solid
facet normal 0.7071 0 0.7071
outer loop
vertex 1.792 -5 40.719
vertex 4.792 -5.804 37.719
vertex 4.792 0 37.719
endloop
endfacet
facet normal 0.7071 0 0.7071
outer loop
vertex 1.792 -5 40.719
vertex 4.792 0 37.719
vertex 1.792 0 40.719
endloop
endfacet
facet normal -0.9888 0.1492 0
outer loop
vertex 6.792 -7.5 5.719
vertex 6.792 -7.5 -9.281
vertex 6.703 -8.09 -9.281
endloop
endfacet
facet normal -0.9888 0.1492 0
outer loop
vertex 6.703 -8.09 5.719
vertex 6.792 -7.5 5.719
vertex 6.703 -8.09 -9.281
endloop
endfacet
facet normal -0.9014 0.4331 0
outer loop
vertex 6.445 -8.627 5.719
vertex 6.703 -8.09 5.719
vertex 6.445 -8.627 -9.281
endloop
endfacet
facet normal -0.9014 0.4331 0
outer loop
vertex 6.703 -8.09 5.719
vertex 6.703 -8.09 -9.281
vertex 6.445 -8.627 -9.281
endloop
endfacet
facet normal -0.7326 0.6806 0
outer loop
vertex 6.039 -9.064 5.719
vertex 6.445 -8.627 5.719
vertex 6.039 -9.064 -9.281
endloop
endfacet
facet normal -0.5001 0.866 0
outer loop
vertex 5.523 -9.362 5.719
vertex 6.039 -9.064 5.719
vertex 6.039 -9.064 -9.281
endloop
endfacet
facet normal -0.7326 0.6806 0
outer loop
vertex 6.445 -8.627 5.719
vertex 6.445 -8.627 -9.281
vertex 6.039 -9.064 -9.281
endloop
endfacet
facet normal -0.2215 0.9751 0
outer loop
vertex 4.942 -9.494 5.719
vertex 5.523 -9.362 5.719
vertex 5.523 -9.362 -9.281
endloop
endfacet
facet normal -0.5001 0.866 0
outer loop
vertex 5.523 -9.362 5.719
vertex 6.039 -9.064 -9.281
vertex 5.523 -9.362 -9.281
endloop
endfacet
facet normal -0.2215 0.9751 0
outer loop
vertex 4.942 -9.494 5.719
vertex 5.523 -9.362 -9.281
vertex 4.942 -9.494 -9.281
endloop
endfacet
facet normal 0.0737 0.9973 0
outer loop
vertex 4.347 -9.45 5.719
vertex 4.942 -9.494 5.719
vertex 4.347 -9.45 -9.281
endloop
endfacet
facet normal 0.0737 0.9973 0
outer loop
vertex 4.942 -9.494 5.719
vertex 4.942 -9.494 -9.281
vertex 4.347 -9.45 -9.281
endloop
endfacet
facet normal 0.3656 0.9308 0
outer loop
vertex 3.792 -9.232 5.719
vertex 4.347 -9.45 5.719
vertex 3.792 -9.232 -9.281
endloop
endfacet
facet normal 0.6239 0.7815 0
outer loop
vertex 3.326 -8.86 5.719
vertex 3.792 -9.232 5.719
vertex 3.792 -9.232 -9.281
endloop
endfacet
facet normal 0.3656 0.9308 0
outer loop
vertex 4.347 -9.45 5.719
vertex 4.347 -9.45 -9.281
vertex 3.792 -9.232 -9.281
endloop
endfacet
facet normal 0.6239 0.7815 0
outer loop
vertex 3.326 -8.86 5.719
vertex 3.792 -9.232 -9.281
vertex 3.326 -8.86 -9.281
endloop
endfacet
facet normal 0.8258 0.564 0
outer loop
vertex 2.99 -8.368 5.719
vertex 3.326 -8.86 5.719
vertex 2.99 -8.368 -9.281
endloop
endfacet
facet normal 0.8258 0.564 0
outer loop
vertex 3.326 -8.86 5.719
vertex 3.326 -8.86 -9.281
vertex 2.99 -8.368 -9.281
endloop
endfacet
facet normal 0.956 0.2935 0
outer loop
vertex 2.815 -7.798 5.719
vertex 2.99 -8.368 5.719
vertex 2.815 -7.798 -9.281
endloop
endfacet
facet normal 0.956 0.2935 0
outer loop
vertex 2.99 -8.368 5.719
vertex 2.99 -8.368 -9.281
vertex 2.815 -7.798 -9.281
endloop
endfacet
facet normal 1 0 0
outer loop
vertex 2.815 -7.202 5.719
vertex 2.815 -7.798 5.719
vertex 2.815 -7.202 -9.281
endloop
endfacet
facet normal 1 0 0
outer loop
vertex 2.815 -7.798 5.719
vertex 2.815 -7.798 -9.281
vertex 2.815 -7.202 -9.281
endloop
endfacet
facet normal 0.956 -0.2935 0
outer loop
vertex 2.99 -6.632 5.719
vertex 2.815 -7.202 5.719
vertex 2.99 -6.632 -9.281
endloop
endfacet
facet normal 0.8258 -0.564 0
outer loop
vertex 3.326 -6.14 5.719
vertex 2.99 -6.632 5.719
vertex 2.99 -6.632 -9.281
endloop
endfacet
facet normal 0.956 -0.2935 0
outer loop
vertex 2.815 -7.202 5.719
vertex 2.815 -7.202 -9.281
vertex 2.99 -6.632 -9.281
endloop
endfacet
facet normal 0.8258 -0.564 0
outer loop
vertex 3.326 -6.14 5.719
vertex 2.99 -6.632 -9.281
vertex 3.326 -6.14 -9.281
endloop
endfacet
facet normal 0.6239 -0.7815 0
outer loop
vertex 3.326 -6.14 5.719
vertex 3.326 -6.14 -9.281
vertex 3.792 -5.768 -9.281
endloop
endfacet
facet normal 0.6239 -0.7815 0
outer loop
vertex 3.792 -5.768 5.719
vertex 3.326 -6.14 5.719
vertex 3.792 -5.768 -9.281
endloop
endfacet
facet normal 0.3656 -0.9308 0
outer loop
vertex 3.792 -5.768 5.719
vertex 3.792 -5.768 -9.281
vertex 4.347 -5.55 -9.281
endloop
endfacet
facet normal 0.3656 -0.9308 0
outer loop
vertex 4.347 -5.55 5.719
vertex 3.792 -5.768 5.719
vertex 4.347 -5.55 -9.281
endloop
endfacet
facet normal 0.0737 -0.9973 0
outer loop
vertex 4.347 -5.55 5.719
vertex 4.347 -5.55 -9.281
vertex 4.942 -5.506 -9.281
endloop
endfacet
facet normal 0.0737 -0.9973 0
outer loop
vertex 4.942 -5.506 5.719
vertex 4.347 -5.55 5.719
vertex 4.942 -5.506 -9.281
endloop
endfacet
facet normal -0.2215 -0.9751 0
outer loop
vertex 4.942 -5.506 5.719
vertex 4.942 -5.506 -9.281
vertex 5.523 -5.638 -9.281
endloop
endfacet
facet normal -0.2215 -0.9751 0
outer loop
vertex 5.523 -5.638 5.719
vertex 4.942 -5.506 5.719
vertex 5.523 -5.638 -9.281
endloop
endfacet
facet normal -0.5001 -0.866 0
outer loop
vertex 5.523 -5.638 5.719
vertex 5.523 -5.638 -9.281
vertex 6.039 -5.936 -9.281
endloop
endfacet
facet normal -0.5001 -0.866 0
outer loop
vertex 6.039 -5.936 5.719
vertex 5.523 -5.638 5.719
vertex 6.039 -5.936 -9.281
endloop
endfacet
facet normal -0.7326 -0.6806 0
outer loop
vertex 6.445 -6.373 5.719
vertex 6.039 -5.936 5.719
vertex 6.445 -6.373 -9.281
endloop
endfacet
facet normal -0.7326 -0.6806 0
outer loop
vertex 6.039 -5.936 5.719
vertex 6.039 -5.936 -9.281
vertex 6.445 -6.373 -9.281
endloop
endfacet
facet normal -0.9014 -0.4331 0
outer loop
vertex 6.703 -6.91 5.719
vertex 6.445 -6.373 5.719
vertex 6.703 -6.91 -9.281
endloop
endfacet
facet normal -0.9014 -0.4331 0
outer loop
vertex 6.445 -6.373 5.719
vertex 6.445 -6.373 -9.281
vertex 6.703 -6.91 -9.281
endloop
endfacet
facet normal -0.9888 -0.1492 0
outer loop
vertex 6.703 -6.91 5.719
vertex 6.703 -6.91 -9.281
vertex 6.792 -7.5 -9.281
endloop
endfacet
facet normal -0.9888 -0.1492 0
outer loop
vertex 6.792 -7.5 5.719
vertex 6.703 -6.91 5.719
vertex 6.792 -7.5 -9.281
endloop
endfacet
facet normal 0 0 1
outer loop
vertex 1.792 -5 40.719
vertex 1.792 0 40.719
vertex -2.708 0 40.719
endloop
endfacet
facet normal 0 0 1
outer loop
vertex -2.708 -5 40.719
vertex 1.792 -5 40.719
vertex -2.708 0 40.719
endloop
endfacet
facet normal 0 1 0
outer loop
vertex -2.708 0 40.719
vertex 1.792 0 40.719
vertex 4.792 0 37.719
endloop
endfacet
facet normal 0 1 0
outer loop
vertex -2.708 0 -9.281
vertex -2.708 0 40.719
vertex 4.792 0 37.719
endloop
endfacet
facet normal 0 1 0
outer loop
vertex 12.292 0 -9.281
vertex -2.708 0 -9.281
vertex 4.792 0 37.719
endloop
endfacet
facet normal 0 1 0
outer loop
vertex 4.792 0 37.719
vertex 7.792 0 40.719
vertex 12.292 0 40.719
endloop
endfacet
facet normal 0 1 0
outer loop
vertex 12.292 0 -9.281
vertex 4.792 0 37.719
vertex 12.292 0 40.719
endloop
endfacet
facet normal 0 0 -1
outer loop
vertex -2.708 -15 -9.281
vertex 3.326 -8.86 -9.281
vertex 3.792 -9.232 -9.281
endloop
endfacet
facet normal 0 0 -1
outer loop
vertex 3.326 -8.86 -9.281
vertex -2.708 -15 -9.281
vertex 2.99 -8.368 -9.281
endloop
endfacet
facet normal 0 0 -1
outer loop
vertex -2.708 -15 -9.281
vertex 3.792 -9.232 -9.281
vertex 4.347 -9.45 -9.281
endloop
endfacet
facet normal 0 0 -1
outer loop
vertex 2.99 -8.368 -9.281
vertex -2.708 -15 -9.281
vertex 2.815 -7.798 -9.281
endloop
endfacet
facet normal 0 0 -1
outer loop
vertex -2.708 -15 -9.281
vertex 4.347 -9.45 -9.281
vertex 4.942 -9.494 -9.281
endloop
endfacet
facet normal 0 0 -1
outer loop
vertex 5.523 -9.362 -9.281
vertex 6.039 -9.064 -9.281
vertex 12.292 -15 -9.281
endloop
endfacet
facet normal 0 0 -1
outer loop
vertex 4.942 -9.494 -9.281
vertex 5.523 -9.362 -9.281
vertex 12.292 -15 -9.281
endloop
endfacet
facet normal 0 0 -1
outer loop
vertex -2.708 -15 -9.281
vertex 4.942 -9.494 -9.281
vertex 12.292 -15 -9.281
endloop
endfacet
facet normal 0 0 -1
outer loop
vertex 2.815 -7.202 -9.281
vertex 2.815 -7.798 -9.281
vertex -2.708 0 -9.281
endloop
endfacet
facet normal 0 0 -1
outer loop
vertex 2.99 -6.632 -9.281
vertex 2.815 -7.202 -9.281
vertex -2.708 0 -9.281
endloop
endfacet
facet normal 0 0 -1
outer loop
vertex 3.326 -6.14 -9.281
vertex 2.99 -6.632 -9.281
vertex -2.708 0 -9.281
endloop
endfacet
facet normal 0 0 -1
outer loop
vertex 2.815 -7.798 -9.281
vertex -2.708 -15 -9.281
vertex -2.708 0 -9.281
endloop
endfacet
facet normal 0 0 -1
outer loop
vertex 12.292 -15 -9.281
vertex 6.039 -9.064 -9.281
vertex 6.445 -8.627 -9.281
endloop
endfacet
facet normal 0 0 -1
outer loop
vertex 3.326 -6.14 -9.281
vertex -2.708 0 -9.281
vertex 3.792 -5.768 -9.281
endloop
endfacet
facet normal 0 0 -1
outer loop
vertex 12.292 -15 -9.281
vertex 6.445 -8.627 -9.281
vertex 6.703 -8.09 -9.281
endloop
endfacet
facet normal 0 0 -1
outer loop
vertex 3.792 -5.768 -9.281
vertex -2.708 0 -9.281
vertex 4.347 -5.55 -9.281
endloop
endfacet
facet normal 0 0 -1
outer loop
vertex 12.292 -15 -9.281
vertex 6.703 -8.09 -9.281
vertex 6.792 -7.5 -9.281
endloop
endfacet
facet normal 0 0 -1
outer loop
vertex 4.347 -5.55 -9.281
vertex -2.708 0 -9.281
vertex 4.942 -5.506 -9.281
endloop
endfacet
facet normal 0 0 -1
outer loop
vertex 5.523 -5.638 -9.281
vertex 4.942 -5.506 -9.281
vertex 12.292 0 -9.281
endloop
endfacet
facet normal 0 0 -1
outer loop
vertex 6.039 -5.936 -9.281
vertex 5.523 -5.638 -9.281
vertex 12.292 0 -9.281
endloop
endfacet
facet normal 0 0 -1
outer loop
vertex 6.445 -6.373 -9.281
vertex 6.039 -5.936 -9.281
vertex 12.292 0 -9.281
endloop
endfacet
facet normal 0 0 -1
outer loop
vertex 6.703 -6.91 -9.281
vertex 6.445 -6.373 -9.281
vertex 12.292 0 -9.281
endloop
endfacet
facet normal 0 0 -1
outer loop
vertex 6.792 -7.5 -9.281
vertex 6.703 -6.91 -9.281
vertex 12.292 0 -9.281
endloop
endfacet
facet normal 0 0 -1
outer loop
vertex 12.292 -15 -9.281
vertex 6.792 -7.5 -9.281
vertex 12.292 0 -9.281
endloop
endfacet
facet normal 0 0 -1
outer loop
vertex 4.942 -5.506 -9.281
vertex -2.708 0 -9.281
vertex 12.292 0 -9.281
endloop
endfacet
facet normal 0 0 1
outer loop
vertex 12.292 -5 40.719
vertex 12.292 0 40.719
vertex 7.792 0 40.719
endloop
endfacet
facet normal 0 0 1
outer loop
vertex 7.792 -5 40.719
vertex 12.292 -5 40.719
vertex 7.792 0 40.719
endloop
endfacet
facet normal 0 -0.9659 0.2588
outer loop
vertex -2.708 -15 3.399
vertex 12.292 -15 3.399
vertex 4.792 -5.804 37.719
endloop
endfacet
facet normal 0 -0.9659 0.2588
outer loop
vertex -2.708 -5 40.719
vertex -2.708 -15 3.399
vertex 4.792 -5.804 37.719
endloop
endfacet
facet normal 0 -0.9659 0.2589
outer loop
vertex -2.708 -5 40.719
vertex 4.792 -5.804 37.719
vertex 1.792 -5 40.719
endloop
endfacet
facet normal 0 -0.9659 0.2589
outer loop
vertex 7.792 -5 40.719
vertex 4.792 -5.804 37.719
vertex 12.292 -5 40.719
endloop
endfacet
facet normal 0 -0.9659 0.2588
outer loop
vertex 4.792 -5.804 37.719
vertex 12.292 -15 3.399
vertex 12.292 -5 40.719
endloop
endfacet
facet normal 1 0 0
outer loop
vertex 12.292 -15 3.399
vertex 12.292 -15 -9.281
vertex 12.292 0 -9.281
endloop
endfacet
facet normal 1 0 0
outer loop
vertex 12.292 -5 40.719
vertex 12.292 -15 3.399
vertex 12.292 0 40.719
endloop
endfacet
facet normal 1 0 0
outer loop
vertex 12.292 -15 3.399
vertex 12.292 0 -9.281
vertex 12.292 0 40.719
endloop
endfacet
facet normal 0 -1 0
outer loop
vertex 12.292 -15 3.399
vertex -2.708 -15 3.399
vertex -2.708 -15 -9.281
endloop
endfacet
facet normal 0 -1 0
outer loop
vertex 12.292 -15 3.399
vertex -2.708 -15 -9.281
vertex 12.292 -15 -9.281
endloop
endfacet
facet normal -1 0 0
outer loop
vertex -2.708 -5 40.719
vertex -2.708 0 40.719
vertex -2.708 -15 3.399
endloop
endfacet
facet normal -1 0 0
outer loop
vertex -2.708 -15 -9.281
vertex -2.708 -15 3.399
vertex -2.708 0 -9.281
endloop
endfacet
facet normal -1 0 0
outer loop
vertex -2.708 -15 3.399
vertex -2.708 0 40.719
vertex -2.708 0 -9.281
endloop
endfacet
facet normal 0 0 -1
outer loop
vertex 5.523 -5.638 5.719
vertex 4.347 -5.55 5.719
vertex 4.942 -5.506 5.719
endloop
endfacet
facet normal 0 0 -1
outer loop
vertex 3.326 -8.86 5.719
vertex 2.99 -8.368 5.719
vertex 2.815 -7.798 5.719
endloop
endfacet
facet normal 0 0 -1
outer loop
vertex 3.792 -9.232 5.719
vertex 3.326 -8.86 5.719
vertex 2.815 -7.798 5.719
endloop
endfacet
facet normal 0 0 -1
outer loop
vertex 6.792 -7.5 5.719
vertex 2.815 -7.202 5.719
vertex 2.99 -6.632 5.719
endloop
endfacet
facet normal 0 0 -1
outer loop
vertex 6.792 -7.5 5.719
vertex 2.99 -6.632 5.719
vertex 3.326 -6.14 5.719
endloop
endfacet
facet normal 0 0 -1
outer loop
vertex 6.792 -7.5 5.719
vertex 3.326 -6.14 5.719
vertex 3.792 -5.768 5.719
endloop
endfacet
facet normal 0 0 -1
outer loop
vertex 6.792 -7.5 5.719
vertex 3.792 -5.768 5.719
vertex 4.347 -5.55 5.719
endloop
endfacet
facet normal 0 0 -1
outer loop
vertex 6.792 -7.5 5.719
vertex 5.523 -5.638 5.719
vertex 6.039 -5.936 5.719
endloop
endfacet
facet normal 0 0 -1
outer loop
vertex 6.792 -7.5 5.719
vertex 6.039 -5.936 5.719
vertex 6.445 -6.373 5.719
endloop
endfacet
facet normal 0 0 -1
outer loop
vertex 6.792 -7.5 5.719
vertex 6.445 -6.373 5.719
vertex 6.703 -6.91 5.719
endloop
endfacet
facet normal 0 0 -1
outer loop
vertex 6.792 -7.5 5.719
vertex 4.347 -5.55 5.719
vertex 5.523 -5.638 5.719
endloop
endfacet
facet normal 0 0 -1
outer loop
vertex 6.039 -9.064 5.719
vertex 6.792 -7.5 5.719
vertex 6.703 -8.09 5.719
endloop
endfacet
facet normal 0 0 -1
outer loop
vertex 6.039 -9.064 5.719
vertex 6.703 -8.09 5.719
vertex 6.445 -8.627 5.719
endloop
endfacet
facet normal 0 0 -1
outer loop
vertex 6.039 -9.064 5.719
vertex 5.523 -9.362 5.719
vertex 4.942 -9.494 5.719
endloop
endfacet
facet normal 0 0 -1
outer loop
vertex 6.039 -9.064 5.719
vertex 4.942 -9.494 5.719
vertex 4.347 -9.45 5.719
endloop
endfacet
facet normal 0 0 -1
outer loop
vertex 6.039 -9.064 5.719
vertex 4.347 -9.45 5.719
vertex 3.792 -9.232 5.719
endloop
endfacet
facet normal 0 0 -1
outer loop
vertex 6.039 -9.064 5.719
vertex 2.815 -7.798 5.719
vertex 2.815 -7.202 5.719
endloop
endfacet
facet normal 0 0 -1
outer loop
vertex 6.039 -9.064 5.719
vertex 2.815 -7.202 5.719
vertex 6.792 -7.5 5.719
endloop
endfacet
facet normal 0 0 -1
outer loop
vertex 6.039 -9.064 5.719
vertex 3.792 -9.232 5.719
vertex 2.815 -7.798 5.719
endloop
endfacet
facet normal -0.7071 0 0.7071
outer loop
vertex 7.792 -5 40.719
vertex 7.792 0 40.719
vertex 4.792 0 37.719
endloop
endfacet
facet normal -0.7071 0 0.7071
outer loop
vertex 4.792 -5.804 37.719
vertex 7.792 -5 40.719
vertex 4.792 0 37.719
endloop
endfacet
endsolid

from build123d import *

# Parameters (mm, degrees)
F1_DEPTH = 15
F3_DEPTH = 25
F4_R     = 2
F5_DEPTH = 15


with BuildPart() as f1:
    # F0 (on Front) → F1 (new body)
    with BuildSketch(Plane.XZ):
        Polygon((1.792286, 40.719454), (-2.707714, 40.719454), (-2.707714, -9.280546), (12.292286, -9.280546), (12.292286, 40.719454), (7.792286, 40.719454), (4.792286, 37.719454), align=None)
    extrude(amount=F1_DEPTH)

    # F2 (on face) → F3 (cut)
    with BuildSketch(Plane.YZ.offset(12.292286)):
        Polygon((-15, 3.398946), (-5, 40.719454), (-15, 40.719454), align=None)
    extrude(amount=-F3_DEPTH, mode=Mode.SUBTRACT)

    # F4 (on face) → F5 (cut)
    with BuildSketch(Plane(origin=(0, 0, -9.280546), x_dir=(1, 0, 0), z_dir=(0, 0, -1))):
        with Locations((4.792286, 7.5)):
            Circle(F4_R)
    extrude(amount=-F5_DEPTH, mode=Mode.SUBTRACT)


solid = f1.part
